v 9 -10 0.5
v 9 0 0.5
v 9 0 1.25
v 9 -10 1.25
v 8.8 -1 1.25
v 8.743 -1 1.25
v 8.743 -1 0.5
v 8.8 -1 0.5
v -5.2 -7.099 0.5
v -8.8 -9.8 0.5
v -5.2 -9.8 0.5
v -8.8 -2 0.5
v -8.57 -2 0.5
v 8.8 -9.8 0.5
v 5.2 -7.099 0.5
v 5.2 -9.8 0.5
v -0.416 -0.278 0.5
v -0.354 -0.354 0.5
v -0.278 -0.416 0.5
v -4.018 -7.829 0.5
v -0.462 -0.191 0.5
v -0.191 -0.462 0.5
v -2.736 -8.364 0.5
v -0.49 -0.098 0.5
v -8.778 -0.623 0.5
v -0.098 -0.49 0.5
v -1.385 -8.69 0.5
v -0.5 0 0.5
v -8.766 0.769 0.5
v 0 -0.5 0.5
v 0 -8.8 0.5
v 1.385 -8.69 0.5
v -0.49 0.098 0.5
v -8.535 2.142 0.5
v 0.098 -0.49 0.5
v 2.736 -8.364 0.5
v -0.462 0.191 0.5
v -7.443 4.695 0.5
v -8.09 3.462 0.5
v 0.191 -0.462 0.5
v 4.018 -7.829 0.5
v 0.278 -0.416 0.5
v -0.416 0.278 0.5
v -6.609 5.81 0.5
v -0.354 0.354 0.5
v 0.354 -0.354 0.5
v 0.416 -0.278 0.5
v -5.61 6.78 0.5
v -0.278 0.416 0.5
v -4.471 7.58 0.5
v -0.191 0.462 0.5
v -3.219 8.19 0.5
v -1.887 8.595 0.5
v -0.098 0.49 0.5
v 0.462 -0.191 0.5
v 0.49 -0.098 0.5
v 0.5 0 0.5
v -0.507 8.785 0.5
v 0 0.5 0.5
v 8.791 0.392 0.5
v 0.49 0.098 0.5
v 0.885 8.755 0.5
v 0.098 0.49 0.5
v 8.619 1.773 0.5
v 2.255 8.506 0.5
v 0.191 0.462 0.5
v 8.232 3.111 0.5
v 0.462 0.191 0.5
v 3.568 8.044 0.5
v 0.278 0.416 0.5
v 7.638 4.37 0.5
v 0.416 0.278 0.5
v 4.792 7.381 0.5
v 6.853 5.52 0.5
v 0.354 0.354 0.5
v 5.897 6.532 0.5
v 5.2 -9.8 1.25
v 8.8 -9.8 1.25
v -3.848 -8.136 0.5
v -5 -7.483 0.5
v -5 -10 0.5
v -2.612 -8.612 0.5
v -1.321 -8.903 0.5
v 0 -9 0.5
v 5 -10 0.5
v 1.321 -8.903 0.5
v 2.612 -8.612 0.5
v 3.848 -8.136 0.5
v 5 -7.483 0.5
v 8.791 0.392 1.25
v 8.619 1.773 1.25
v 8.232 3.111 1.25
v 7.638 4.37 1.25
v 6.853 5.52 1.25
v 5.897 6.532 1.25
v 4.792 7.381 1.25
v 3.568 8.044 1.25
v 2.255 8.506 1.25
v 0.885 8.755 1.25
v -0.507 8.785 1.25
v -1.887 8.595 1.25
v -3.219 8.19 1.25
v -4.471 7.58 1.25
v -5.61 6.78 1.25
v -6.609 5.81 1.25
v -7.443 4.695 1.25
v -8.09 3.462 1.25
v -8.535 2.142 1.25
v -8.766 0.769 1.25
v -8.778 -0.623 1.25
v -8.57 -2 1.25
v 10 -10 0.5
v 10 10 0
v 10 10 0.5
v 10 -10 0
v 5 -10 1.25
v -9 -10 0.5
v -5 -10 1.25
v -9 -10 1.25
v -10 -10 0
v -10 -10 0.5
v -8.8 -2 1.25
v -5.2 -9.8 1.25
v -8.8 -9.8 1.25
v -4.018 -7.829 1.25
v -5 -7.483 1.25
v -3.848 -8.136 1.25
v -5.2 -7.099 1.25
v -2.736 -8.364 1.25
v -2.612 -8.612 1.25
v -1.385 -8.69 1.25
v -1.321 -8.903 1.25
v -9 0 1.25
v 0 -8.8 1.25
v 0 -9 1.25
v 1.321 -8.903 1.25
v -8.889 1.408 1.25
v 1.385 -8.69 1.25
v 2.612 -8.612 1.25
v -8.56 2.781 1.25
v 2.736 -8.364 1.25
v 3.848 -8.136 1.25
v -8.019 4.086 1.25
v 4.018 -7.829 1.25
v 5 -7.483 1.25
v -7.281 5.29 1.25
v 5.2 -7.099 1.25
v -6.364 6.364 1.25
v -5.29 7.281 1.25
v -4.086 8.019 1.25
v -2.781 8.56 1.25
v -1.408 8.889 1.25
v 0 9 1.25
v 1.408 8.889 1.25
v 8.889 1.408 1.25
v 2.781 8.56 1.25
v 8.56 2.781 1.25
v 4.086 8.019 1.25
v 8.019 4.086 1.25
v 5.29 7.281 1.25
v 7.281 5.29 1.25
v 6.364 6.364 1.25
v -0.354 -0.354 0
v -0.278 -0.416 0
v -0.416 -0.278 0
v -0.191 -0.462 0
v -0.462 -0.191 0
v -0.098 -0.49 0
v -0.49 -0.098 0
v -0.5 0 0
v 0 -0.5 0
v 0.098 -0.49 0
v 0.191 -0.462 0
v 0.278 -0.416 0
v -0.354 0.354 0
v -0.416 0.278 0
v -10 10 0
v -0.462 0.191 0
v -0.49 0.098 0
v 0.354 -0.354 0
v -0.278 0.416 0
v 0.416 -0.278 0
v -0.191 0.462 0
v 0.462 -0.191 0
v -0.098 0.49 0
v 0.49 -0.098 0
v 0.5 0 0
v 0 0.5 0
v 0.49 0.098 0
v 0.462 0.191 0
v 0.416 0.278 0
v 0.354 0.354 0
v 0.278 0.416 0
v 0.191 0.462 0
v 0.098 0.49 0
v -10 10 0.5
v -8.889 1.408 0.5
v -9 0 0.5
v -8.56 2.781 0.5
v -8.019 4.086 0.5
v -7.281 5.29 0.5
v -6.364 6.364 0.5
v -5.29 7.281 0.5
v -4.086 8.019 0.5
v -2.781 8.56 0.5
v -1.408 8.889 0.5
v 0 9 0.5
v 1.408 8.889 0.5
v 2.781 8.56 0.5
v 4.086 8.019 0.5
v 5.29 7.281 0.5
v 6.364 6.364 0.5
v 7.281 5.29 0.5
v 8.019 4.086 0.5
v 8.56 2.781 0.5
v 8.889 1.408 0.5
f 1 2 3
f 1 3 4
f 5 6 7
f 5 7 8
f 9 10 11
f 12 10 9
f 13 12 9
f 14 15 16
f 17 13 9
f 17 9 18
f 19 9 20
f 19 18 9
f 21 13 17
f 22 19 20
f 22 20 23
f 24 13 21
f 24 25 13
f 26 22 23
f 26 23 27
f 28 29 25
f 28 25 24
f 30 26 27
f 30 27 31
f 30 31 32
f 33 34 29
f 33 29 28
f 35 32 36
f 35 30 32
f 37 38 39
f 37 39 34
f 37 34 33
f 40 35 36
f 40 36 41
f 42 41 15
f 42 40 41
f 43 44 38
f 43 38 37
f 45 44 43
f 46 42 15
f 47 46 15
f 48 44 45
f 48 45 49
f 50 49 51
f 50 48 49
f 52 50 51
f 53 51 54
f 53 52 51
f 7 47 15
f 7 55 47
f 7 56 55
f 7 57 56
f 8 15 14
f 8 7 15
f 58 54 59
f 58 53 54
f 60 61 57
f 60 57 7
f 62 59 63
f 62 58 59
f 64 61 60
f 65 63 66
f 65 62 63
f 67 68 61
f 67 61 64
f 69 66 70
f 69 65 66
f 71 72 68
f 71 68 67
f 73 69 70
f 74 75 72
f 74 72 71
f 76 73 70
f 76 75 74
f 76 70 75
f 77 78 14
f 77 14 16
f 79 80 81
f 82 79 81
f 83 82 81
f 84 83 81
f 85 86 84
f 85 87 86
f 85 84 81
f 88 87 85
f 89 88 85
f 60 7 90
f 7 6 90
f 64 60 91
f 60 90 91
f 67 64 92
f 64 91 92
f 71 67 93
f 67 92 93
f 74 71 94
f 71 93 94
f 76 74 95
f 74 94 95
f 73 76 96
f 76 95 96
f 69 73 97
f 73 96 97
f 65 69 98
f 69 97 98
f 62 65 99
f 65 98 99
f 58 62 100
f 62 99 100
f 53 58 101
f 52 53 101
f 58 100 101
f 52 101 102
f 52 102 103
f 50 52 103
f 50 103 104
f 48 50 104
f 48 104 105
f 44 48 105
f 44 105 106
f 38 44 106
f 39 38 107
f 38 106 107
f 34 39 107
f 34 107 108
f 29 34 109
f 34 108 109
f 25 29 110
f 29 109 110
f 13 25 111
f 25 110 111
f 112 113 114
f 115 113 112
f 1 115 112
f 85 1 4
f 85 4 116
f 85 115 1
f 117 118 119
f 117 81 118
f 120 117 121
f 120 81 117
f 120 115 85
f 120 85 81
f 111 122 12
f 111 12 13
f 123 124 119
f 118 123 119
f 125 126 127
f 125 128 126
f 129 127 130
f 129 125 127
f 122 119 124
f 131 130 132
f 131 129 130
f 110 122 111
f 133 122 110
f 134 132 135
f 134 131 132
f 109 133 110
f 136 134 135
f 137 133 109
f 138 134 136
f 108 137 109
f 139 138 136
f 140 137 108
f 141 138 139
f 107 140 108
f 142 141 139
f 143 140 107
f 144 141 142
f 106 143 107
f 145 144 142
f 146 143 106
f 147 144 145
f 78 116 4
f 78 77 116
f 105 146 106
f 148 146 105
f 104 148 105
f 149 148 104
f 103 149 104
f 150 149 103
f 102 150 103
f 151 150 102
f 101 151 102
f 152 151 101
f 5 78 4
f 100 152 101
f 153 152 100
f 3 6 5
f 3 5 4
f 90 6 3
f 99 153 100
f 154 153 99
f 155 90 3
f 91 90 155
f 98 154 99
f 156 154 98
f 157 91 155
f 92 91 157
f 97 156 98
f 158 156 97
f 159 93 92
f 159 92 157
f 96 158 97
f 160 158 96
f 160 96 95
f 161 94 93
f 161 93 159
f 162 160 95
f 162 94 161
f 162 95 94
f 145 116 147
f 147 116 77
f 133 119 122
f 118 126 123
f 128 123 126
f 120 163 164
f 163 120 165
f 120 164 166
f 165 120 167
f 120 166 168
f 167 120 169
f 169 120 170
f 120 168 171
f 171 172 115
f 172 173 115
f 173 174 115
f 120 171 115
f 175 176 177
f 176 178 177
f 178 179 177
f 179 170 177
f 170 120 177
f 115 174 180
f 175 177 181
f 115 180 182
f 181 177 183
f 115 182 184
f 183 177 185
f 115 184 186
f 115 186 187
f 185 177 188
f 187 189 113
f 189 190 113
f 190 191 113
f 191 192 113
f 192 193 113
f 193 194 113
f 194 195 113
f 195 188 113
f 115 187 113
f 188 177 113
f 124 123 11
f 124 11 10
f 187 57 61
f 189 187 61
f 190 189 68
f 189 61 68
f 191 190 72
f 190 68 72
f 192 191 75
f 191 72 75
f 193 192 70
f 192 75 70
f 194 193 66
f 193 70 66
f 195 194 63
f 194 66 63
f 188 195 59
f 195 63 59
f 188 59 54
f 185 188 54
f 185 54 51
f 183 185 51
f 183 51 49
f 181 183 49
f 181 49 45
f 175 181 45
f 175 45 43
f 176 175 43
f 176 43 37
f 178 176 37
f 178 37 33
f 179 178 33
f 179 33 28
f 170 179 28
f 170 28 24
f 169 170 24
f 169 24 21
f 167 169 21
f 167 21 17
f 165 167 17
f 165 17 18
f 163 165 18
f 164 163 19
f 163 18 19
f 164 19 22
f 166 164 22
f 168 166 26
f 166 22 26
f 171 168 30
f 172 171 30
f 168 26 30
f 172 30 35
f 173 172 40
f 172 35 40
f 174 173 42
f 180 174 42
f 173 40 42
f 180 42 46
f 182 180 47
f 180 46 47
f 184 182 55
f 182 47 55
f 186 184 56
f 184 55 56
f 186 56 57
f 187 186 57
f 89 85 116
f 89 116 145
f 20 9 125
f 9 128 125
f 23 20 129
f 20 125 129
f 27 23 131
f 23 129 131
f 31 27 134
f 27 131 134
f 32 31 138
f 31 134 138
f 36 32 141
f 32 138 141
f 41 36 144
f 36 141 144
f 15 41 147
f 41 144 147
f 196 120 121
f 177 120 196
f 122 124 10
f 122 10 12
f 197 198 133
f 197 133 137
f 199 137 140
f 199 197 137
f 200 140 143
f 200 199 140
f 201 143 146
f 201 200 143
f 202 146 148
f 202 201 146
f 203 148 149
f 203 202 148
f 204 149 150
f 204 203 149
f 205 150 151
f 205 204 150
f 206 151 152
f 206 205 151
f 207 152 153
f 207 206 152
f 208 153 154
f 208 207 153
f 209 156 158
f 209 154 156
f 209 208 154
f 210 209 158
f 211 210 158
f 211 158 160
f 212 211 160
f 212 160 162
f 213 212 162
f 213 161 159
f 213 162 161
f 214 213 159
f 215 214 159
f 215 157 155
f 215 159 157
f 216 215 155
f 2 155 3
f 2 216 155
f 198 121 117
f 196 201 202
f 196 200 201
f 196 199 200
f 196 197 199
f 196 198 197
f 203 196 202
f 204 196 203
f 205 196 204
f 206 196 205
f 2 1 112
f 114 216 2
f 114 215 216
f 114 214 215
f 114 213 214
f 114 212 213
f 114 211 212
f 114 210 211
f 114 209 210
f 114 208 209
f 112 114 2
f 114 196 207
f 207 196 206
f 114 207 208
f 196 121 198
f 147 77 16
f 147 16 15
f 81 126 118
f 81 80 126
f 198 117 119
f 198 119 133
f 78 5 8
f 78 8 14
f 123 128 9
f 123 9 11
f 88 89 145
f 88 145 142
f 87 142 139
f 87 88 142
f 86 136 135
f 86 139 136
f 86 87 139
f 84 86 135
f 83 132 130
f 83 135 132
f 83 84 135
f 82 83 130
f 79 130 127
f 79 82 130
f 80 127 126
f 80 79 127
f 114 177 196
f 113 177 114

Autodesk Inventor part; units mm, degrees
ref_plane "YZ Plane" through (0, 0, 0) normal (1, 0, 0) x (0, 1, 0)
ref_plane "XZ Plane" through (0, 0, 0) normal (0, 1, 0) x (-1, 0, 0)
ref_plane "XY Plane" through (0, 0, 0) normal (0, 0, 1) x (1, 0, 0)
sketch "Sketch1" plane through (0, 0, 0) normal (0, 0, 1) x (1, 0, 0)
  line L0 (10, -10) -> (-10, -10)
  line L1 (-10, -10) -> (-10, 10)
  line L2 (-10, 10) -> (10, 10)
  line L3 (10, 10) -> (10, -10)
  line L4 (10, -10) -> (-10, 10) construction
  line L5 (-10, -10) -> (10, 10) construction
  point P0 (0, 0)
  dimension "d0" = 20
  dimension "d1" = 20
extrude "Extrusion1" add sketch "Sketch1" along normal blind 0.5
sketch "Sketch2" plane through (0, 0, 0.5) normal (0, 0, 1) x (1, 0, 0)
  point P0 (0, 0)
sketch "Sketch3" plane through (0, 0, 0.5) normal (0, 0, 1) x (1, 0, 0)
  line L0 (-10, -10) -> (10, -10) projected
  line L1 (-5, -7.4833) -> (-5, -10)
  line L2 (-5, -10) -> (-9, -10)
  line L3 (-9, -10) -> (-9, 0)
  line L4 (5, 0) -> (9, 0)
  line L5 (9, 0) -> (9, -10)
  line L6 (9, -10) -> (5, -10)
  line L7 (5, -10) -> (5, -7.4833)
  line L8 (-10, 10) -> (-10, -10) projected
  line L9 (10, -10) -> (10, 10) projected
  arc A0 (-5, -7.4833) -> (5, -7.4833) centre (0, 0) ccw
  arc A1 (9, 0) -> (-9, 0) centre (0, 0) ccw
  dimension "d4" = 4
  dimension "d5" = 1
  dimension "d6" = 1
extrude "Extrusion2" add sketch "Sketch3" along normal blind 0.75 contours L3 A1 L5 L0 L7 A0 L1
sketch "Sketch4" plane through (0, 0, 1.25) normal (0, 0, 1) x (1, 0, 0)
  line L0 (-8.8, -2) -> (-8.5697, -2)
  line L1 (-5.2, -7.0993) -> (-5.2, -9.8)
  line L2 (-5.2, -9.8) -> (-8.8, -9.8)
  line L3 (-8.8, -9.8) -> (-8.8, -2)
  line L4 (-9, 0) -> (-9, -10) projected
  line L5 (-9, -10) -> (-5, -10) projected
  line L6 (-5, -10) -> (-5, -7.4833) projected
  line L7 (8.743, -1) -> (8.8, -1)
  line L8 (8.8, -1) -> (8.8, -9.8)
  line L9 (8.8, -9.8) -> (5.2, -9.8)
  line L10 (5.2, -9.8) -> (5.2, -7.0993)
  line L11 (9, -10) -> (9, 0) projected
  line L12 (5, -10) -> (9, -10) projected
  line L13 (5, -7.4833) -> (5, -10) projected
  arc A0 (-5.2, -7.0993) -> (5.2, -7.0993) centre (0, 0) ccw
  arc A1 (8.743, -1) -> (-8.5697, -2) centre (0, 0) ccw
  dimension "d9" = 0.2
  dimension "d10" = 0.2
  dimension "d11" = 0.2
  dimension "d12" = 0.2
  dimension "d13" = 0.2
  dimension "d14" = 0.2
extrude "Extrusion3" cut sketch "Sketch4" against normal blind 0.75
sketch "Sketch6" plane through (0, 0, 0.5) normal (0, 0, 1) x (1, 0, 0)
  point P0 (0, 0)
sketch "Sketch9" plane through (0, 0, 0.5) normal (0, 0, 1) x (1, 0, 0)
  circle A0 centre (0, 0) radius 0.5
  dimension "d20" = 1
extrude "Extrusion5" cut sketch "Sketch9" against normal blind 0.5
properties part number "base" material "Aluminum 3004-H32"
